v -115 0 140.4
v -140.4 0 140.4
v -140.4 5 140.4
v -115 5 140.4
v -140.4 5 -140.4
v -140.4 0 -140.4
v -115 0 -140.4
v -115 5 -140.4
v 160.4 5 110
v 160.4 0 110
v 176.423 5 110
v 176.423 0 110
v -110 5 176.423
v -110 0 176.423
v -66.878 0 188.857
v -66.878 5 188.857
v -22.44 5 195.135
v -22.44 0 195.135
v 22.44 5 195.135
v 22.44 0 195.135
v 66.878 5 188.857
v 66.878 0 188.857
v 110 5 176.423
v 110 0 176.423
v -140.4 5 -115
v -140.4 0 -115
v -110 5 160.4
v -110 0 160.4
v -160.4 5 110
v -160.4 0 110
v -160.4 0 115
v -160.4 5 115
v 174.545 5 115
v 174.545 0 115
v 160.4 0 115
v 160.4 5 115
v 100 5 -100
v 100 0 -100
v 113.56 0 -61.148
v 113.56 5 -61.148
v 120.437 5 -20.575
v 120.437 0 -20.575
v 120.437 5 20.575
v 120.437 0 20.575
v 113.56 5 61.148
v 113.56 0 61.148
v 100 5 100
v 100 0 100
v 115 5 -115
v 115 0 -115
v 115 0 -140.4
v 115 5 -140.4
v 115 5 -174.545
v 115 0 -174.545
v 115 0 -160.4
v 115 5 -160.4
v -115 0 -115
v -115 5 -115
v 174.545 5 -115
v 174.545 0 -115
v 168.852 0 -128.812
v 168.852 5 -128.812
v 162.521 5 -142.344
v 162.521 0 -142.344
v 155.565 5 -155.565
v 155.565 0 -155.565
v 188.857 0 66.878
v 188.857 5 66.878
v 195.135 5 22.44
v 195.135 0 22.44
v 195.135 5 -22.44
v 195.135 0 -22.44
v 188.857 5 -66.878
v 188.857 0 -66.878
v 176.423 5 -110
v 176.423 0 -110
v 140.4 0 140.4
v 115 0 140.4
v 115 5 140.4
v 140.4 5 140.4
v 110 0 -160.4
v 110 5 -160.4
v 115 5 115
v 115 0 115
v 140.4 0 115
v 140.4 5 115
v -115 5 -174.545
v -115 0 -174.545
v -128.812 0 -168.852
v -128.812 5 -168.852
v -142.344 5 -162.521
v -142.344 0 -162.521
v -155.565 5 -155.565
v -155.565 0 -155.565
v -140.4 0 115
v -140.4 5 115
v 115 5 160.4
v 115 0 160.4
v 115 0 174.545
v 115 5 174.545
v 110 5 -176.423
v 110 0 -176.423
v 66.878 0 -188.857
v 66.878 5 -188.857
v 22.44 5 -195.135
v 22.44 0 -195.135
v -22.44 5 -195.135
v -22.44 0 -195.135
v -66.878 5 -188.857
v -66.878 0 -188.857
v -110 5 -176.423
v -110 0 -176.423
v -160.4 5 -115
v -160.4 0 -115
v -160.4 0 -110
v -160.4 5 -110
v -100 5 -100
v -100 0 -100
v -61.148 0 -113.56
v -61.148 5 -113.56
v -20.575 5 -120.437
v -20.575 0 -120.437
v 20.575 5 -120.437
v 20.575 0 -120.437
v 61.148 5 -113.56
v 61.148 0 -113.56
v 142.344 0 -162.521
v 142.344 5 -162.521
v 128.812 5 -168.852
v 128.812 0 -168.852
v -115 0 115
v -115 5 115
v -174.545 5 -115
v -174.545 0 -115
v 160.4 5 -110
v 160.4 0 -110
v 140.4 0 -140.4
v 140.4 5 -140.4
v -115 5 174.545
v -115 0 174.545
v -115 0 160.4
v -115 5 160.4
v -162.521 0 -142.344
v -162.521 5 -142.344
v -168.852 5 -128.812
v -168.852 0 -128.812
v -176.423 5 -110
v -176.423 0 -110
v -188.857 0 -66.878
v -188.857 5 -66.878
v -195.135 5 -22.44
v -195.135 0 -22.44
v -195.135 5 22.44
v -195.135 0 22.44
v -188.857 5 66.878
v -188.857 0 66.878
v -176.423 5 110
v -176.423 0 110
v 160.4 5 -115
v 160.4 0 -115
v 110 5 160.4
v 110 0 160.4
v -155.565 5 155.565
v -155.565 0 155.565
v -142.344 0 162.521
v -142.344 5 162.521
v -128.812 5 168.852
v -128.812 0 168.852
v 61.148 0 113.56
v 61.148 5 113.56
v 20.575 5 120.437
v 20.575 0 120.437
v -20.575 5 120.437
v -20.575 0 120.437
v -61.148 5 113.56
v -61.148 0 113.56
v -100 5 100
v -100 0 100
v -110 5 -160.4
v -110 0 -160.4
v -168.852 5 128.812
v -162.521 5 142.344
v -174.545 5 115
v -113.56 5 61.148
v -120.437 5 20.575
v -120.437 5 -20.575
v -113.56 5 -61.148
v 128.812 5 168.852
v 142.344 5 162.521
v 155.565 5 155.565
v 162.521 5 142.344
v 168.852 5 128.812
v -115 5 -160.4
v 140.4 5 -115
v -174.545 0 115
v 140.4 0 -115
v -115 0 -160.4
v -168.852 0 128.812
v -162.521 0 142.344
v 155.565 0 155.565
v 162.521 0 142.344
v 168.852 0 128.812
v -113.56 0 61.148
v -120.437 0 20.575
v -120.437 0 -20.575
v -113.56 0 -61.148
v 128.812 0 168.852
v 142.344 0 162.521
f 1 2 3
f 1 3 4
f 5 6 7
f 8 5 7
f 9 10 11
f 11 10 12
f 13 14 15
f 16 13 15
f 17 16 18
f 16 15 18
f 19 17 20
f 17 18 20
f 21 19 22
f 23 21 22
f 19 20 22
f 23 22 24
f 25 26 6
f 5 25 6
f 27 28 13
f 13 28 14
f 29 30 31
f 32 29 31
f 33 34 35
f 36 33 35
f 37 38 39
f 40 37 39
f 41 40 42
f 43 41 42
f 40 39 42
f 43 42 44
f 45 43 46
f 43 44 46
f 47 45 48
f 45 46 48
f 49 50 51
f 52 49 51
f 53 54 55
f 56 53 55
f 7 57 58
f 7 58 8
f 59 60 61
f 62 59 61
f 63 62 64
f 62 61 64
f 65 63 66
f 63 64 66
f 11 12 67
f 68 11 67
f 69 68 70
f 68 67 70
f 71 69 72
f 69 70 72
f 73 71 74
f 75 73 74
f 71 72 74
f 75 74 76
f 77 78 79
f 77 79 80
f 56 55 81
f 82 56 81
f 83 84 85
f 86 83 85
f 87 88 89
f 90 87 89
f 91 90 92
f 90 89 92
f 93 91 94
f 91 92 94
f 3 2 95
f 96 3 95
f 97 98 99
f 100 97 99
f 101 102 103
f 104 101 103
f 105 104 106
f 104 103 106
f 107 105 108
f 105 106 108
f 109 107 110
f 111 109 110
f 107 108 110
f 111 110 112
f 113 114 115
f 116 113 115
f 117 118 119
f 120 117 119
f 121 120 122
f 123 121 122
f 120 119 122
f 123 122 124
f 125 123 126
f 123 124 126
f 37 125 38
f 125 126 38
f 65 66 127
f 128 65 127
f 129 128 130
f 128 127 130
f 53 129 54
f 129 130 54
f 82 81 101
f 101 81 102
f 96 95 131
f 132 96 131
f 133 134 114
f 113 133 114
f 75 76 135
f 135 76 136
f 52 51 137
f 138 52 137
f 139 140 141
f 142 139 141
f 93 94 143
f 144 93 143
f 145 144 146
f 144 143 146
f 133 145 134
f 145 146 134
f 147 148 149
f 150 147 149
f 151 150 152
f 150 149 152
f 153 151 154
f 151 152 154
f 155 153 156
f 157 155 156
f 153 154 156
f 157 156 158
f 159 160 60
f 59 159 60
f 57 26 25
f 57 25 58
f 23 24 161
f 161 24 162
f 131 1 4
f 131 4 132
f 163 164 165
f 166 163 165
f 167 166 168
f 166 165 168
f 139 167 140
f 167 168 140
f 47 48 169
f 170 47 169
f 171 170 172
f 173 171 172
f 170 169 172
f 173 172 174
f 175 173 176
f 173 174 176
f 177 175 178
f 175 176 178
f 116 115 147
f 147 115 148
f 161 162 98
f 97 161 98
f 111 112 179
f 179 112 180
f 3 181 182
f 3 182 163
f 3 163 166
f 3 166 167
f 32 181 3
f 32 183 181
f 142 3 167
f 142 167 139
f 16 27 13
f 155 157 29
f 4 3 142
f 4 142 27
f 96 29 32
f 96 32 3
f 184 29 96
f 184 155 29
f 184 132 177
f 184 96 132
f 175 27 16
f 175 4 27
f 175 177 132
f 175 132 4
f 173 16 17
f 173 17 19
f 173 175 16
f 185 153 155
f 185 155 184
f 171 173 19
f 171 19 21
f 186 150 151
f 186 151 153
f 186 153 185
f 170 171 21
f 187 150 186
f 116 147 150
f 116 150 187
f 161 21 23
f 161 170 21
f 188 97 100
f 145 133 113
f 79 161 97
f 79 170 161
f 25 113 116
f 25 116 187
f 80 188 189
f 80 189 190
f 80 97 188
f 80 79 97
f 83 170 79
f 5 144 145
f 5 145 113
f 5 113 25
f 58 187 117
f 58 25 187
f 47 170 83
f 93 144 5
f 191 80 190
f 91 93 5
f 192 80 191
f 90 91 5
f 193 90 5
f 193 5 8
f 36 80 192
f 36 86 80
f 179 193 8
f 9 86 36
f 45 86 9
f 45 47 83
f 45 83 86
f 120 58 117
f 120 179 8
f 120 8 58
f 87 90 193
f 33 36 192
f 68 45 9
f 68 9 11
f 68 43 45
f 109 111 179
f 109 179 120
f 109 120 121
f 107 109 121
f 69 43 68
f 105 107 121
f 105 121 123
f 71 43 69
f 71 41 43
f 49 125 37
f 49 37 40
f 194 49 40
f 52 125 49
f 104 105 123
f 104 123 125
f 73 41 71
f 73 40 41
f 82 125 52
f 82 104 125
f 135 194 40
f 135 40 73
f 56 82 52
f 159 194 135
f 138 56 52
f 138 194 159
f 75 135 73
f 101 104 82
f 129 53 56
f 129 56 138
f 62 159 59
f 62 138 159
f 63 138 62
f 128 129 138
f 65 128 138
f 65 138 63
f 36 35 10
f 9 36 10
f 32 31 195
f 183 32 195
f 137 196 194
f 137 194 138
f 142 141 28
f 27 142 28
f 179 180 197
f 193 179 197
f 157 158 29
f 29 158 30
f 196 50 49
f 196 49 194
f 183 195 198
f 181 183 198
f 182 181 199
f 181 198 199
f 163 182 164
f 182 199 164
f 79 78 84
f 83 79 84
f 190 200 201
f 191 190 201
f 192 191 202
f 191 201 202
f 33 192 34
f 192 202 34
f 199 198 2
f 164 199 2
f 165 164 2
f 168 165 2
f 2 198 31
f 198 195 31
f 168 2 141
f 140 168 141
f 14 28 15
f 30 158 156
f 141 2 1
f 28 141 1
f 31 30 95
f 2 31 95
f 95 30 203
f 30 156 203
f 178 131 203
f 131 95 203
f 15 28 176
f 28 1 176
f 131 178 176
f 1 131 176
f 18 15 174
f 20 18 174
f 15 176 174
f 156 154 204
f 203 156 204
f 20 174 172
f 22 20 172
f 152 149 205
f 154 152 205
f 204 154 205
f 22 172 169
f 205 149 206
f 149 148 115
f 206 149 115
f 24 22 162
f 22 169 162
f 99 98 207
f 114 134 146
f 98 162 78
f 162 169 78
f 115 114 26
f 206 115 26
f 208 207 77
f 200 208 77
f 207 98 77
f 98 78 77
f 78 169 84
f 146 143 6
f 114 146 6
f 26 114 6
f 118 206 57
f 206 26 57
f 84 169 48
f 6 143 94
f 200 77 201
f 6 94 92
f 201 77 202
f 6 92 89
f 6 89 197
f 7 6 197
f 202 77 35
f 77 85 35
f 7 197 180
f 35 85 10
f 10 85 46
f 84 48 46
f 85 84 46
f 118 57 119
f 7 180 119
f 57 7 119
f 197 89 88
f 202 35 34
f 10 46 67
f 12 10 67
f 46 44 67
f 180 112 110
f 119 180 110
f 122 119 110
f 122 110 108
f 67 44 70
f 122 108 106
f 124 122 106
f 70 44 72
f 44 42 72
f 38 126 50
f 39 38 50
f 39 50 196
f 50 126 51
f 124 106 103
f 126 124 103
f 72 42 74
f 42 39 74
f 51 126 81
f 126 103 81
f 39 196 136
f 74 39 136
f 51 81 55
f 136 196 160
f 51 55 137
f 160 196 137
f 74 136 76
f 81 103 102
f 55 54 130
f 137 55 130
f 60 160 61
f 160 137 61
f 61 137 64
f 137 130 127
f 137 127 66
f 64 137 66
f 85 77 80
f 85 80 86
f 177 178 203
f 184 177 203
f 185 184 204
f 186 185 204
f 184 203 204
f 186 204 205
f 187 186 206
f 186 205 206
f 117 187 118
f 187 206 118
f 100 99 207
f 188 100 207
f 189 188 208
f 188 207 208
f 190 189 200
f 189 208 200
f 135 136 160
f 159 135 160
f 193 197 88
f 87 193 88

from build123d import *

# Parameters (mm, degrees)
SKETCH1_W           = 25.4
SKETCH1_H           = 25.4
BOSS_EXTRUDE1_DEPTH = 5


with BuildPart() as part:
    # Sketch1 → Boss-Extrude1 (new body)
    with BuildSketch(Plane(origin=(0, 0, 0), x_dir=(1, 0, 0), z_dir=(0, 1, 0))):
        with BuildLine():
            Line((115, 160.4), (110, 160.4))
            Line((110, 160.4), (110, 176.422793918))
            ThreePointArc((110, 176.422793918), (0, 195.923209892), (-110, 176.422793918))
            Line((-110, 176.422793918), (-110, 160.4))
            Line((-110, 160.4), (-115, 160.4))
            Line((-115, 160.4), (-115, 174.545044324))
            ThreePointArc((-115, 174.545044324), (-135.614952446, 165.765554405), (-155.565, 155.565))
            ThreePointArc((-155.565, 155.565), (-165.765554405, 135.614952446), (-174.545044324, 115))
            Line((-174.545044324, 115), (-160.4, 115))
            Line((-160.4, 115), (-160.4, 110))
            Line((-160.4, 110), (-176.422793918, 110))
            ThreePointArc((-176.422793918, 110), (-195.923209892, 0), (-176.422793918, -110))
            Line((-176.422793918, -110), (-160.4, -110))
            Line((-160.4, -110), (-160.4, -115))
            Line((-160.4, -115), (-174.545044324, -115))
            ThreePointArc((-174.545044324, -115), (-165.765554405, -135.614952446), (-155.565, -155.565))
            ThreePointArc((-155.565, -155.565), (-135.614952446, -165.765554405), (-115, -174.545044324))
            Line((-115, -174.545044324), (-115, -160.4))
            Line((-115, -160.4), (-110, -160.4))
            Line((-110, -160.4), (-110, -176.422793918))
            ThreePointArc((-110, -176.422793918), (0, -195.923209892), (110, -176.422793918))
            Line((110, -176.422793918), (110, -160.4))
            Line((110, -160.4), (115, -160.4))
            Line((115, -160.4), (115, -174.545044324))
            ThreePointArc((115, -174.545044324), (135.614952446, -165.765554405), (155.565, -155.565))
            ThreePointArc((155.565, -155.565), (165.765554405, -135.614952446), (174.545044324, -115))
            Line((174.545044324, -115), (160.4, -115))
            Line((160.4, -115), (160.4, -110))
            Line((160.4, -110), (176.422793918, -110))
            ThreePointArc((176.422793918, -110), (195.923209892, 0), (176.422793918, 110))
            Line((176.422793918, 110), (160.4, 110))
            Line((160.4, 110), (160.4, 115))
            Line((160.4, 115), (174.545044324, 115))
            ThreePointArc((174.545044324, 115), (165.765554405, 135.614952446), (155.565, 155.565))
            ThreePointArc((155.565, 155.565), (135.614952446, 165.765554405), (115, 174.545044324))
            Line((115, 174.545044324), (115, 160.4))
        make_face()
        with Locations((127.7, 127.7)):
            Rectangle(SKETCH1_W, SKETCH1_H, mode=Mode.SUBTRACT)
        with Locations((-127.7, 127.7)):
            Rectangle(SKETCH1_W, SKETCH1_H, mode=Mode.SUBTRACT)
        with Locations((127.7, -127.7)):
            Rectangle(SKETCH1_W, SKETCH1_H, mode=Mode.SUBTRACT)
        with Locations((-127.7, -127.7)):
            Rectangle(SKETCH1_W, SKETCH1_H, mode=Mode.SUBTRACT)
        with BuildLine():
            ThreePointArc((-100, 100), (0, 121.301301549), (100, 100))
            ThreePointArc((100, 100), (121.301301549, 0), (100, -100))
            ThreePointArc((100, -100), (0, -121.301301549), (-100, -100))
            ThreePointArc((-100, -100), (-121.301301549, 0), (-100, 100))
        make_face(mode=Mode.SUBTRACT)
    extrude(amount=BOSS_EXTRUDE1_DEPTH)


solid = part.part
